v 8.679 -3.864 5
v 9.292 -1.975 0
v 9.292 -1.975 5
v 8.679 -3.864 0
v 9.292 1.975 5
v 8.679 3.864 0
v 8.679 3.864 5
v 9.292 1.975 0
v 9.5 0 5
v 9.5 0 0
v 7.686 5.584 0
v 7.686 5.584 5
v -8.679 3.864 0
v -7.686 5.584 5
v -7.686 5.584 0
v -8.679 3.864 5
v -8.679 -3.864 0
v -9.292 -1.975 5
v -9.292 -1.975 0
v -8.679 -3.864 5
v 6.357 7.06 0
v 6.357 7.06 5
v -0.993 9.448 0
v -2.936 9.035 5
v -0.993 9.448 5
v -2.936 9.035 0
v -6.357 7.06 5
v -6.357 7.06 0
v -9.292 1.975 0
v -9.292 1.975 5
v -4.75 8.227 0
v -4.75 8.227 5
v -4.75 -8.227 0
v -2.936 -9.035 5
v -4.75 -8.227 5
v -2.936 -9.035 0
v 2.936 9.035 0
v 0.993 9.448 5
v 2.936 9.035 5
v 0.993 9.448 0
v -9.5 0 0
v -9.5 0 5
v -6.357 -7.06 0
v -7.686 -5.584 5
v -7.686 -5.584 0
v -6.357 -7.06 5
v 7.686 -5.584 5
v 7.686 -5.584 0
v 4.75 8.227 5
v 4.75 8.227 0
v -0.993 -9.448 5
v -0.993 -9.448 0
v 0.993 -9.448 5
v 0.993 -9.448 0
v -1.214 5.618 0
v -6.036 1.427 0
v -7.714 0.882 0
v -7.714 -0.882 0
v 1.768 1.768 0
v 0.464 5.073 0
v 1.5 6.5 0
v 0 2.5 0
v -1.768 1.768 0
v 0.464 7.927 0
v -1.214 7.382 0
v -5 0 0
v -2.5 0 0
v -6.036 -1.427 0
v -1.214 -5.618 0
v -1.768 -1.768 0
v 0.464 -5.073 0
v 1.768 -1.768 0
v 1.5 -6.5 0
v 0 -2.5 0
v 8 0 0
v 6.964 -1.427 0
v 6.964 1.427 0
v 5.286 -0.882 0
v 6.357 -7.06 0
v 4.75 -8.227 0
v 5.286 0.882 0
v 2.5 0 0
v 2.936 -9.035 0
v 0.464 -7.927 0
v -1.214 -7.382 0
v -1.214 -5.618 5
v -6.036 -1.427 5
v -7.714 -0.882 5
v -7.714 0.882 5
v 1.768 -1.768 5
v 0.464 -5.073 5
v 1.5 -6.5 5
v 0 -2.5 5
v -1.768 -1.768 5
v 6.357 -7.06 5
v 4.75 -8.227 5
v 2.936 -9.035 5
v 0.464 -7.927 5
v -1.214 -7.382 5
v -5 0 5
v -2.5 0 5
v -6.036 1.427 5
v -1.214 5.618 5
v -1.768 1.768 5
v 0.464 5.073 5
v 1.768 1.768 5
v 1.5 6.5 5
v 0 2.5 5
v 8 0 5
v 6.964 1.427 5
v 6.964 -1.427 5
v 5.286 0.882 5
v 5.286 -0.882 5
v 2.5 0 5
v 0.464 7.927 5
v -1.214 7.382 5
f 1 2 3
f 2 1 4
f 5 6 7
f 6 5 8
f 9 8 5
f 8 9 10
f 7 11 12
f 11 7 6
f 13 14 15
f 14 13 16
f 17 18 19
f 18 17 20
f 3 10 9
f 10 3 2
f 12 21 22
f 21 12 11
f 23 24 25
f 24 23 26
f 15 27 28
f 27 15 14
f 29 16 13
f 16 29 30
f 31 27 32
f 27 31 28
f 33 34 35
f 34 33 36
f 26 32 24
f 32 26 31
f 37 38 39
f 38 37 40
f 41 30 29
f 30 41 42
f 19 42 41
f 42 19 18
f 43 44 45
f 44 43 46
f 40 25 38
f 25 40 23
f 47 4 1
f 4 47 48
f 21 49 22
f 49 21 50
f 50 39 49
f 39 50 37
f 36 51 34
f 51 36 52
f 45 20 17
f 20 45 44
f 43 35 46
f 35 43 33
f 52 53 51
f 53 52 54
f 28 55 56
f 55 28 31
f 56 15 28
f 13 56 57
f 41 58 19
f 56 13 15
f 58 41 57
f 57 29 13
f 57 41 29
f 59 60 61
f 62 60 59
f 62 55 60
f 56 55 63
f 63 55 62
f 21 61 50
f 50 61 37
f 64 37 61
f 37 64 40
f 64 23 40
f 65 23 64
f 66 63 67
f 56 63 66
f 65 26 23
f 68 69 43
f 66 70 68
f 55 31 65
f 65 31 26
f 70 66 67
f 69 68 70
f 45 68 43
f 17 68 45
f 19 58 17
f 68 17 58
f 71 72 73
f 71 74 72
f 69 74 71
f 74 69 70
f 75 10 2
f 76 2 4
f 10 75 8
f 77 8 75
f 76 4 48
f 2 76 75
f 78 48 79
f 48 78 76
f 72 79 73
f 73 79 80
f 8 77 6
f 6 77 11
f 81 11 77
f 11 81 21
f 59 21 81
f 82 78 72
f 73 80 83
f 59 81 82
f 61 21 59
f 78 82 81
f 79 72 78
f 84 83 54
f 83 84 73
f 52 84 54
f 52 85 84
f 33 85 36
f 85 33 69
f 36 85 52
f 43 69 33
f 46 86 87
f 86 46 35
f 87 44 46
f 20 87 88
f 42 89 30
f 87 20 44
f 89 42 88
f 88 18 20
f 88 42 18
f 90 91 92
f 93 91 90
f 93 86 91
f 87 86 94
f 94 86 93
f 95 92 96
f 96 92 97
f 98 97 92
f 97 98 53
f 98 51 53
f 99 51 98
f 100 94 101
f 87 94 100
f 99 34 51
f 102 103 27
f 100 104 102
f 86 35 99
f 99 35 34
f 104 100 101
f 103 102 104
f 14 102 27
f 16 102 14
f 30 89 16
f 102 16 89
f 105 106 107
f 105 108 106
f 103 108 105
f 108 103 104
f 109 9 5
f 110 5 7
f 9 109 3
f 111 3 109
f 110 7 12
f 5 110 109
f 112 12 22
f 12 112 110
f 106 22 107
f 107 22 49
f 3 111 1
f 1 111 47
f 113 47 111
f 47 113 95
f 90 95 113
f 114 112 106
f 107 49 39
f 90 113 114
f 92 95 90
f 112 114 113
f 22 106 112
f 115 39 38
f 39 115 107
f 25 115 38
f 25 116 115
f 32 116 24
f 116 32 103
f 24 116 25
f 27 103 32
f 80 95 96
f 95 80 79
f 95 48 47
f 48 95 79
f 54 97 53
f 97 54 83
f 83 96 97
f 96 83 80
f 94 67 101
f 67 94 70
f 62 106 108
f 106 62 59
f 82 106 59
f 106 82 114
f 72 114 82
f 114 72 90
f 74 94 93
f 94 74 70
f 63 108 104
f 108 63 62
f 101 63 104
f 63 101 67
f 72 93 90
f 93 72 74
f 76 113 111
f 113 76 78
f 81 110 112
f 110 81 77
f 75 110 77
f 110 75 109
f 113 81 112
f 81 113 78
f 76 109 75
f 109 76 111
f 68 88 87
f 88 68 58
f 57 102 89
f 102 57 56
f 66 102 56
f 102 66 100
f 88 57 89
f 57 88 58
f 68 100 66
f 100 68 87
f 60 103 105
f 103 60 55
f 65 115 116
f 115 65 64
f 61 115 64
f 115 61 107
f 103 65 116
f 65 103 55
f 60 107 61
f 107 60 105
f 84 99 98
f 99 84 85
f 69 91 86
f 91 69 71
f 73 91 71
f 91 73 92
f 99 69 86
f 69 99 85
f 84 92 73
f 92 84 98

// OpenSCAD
c_height = 5;
c_diam = 19;
sc_diam = 3; // screw hole diameter, 4-40 screws
gs_diam = 5; // gearshaft hole diameter
sc_offset = 6.5;

difference() {
    cylinder(c_height, c_diam / 2, c_diam / 2, false);
    
    cylinder(c_height, gs_diam / 2, gs_diam / 2, false);
    
    translate([sc_offset, 0, 0]) cylinder(c_height, sc_diam / 2, sc_diam / 2, false);
    translate([-sc_offset, 0, 0]) cylinder(c_height, sc_diam / 2, sc_diam / 2, false);
    translate([0, sc_offset, 0]) cylinder(c_height, sc_diam / 2, sc_diam / 2, false);
    translate([0, -sc_offset, 0]) cylinder(c_height, sc_diam / 2, sc_diam / 2, false);
}
